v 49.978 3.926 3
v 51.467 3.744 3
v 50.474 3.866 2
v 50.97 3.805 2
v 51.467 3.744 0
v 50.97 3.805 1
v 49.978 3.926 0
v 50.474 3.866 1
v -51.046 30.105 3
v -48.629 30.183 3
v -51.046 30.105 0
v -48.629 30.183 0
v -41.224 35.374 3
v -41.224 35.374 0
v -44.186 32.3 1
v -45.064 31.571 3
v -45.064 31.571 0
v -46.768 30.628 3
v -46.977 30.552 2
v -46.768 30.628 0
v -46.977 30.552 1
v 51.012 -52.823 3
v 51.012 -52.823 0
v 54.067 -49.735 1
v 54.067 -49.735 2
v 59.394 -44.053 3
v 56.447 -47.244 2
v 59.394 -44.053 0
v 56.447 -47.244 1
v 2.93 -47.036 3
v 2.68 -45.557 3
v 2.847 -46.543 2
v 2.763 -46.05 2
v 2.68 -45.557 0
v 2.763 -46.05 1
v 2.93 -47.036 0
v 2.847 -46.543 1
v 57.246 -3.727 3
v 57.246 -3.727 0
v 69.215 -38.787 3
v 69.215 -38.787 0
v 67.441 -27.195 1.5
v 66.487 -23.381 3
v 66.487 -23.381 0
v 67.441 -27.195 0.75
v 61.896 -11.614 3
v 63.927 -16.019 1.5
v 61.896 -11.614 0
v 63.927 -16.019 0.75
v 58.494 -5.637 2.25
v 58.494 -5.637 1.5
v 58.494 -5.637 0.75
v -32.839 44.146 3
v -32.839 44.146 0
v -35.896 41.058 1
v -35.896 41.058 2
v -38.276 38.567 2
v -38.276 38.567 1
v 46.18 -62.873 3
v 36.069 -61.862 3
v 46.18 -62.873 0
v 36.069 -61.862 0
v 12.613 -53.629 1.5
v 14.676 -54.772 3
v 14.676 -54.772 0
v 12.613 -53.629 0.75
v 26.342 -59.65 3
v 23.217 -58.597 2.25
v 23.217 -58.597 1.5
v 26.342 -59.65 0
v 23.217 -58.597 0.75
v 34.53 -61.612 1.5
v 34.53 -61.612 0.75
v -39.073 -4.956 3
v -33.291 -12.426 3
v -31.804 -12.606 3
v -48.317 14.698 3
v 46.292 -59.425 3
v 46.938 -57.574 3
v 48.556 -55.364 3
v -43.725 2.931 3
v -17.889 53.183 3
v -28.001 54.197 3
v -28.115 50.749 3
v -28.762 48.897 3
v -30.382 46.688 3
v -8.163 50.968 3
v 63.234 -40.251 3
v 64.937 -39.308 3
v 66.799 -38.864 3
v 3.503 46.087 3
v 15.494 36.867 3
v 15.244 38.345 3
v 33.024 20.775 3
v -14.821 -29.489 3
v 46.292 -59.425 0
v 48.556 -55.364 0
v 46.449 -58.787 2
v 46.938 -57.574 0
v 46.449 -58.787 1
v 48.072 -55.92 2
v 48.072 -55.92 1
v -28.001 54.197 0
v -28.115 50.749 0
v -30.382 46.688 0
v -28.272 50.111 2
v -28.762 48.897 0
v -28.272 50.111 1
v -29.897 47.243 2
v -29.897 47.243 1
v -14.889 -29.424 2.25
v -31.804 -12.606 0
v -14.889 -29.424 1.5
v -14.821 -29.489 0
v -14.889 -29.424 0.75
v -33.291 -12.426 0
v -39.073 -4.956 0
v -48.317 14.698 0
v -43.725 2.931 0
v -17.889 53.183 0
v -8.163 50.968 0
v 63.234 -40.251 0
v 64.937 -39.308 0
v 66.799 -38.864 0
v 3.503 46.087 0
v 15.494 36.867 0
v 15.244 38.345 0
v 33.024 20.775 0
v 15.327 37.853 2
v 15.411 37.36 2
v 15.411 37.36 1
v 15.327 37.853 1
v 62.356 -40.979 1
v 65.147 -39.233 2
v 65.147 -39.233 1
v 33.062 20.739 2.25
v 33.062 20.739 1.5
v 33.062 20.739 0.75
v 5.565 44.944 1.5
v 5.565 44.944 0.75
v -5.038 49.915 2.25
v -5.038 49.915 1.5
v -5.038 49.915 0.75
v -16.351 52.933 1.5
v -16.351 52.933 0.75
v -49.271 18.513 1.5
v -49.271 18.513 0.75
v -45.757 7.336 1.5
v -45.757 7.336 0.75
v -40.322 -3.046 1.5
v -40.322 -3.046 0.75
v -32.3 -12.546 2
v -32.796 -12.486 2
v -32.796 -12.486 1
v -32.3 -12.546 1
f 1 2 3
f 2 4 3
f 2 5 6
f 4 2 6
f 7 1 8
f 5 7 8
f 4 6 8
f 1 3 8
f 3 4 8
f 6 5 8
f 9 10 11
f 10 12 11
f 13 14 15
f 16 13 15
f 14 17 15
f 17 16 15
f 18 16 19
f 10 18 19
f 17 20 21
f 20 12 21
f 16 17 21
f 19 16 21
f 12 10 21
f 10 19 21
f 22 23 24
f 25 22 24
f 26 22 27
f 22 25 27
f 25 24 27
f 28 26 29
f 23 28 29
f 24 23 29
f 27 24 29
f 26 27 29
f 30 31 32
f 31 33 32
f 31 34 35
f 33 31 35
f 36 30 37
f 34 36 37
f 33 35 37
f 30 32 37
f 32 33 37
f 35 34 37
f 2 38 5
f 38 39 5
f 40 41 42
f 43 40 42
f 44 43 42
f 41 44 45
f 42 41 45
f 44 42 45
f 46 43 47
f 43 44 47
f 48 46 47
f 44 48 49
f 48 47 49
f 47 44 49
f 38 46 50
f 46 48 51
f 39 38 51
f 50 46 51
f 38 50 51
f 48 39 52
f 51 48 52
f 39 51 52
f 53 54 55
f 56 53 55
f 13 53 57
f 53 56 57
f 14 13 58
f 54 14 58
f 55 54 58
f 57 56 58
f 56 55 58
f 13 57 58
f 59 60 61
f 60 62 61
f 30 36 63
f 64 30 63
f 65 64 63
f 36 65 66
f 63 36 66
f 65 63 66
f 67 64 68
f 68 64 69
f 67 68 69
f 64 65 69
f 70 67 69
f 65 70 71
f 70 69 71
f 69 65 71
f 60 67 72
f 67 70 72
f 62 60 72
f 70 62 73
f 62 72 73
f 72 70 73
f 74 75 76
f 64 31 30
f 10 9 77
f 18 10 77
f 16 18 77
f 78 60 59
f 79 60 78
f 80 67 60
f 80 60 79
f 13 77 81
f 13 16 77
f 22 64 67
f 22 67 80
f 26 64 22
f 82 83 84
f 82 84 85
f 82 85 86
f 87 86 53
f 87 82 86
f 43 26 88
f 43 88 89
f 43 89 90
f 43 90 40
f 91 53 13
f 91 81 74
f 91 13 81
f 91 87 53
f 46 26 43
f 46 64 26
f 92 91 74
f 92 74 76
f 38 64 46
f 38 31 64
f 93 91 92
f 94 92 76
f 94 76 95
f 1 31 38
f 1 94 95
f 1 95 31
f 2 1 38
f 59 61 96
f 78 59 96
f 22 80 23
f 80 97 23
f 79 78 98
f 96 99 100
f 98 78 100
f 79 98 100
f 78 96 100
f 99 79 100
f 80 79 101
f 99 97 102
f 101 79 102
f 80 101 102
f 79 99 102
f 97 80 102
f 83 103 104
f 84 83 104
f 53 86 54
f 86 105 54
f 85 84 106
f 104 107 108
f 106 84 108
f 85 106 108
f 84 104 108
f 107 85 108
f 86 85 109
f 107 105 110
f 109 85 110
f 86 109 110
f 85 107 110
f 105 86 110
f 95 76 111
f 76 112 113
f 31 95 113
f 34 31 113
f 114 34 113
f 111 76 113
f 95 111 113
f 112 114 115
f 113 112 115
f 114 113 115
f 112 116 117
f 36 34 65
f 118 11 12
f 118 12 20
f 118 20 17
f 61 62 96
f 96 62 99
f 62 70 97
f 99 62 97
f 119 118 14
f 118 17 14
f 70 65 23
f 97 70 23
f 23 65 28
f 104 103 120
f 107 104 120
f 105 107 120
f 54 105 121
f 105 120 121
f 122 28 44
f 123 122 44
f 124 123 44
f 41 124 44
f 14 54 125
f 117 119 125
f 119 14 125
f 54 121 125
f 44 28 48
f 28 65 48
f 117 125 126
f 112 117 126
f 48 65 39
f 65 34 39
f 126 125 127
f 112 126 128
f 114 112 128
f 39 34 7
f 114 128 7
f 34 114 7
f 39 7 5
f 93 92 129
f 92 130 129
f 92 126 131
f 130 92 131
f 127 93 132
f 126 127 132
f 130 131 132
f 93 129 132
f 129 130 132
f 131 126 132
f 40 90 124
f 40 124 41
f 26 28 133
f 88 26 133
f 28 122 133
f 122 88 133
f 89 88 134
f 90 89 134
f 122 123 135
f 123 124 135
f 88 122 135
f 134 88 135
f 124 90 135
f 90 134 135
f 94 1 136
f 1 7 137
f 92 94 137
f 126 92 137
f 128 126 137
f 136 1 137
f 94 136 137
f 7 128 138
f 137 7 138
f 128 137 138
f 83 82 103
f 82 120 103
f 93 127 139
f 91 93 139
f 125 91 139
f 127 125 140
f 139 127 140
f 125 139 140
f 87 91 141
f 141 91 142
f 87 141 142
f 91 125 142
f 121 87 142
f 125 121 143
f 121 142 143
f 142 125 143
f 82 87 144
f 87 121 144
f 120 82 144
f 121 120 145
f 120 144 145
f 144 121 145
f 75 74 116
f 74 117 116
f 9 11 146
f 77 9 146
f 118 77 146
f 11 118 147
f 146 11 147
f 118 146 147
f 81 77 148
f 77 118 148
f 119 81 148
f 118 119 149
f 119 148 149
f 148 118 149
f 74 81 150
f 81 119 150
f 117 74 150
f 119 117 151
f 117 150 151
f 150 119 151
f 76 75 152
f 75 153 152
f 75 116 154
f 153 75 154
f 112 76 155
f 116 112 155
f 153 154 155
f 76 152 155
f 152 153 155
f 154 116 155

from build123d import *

# Parameters (mm, degrees)
EXTRUDE_1_DEPTH = 3


with BuildPart() as part:
    # Model → Бобышка-Вытянуть1 (new body)
    with BuildSketch(Plane.XY):
        with BuildLine():
            add(Edge.make_bspline(
                [(2.93021052, -47.035829845), (7.067392634, -50.203408799), (9.192109773, -51.661949534), (16.033912525, -55.596417645), (19.531782895, -57.247377963), (26.901706576, -59.946143344), (30.729833359, -60.954279881), (38.329709704, -62.270501958), (40.987603987, -62.444811681), (46.180399423, -62.872756714)],
                knots=[0, 0, 0, 0, 0.25, 0.25, 0.5, 0.5, 0.75, 0.75, 1, 1, 1, 1], degree=3))
            add(Edge.make_bspline(
                [(46.180399423, -62.872756714), (45.758819222, -57.695353797), (47.425592056, -56.517371281), (51.012465844, -52.822648474)],
                knots=[0, 0, 0, 0, 1, 1, 1, 1], degree=3))
            add(Edge.make_bspline(
                [(51.012465844, -52.822648474), (54.819045751, -49.003718884), (55.749845461, -48.027023084), (59.394302363, -44.053029207)],
                knots=[0, 0, 0, 0, 1, 1, 1, 1], degree=3))
            add(Edge.make_bspline(
                [(59.394302363, -44.053029207), (62.922497168, -40.306572328), (64.027232354, -38.591746706), (69.215147689, -38.786552958)],
                knots=[0, 0, 0, 0, 1, 1, 1, 1], degree=3))
            add(Edge.make_bspline(
                [(69.215147689, -38.786552958), (68.559823273, -33.614049971), (68.287529116, -31.05697886), (66.59488265, -23.333351959), (65.426938577, -19.616873752), (62.427174816, -12.420563312), (60.576503981, -8.914752048), (56.410752014, -2.359714152), (54.822950455, -0.246005976), (51.466536582, 3.743837686)],
                knots=[0, 0, 0, 0, 0.25, 0.25, 0.5, 0.5, 0.75, 0.75, 1, 1, 1, 1], degree=3))
            add(Edge.make_bspline(
                [(51.466536582, 3.743837686), (50.970330899, 3.804673675), (50.474125217, 3.865509664), (49.977918997, 3.926346223)],
                knots=[0, 0, 0, 0, 1, 1, 1, 1], degree=3))
            add(Edge.make_bspline(
                [(49.977918997, 3.926346223), (46.342202727, 7.78345872), (44.298418779, 9.797169906), (38.948827381, 15.075374053), (35.988080117, 17.943328603), (30.136171062, 23.533872679), (27.409247326, 26.107876823), (21.345767872, 31.71622684), (19.515288118, 33.414658565), (15.493611073, 36.867480358)],
                knots=[0, 0, 0, 0, 0.25, 0.25, 0.5, 0.5, 0.75, 0.75, 1, 1, 1, 1], degree=3))
            add(Edge.make_bspline(
                [(15.493611073, 36.867480358), (15.410547933, 37.360005635), (15.327484793, 37.852530912), (15.244421071, 38.345056635)],
                knots=[0, 0, 0, 0, 1, 1, 1, 1], degree=3))
            add(Edge.make_bspline(
                [(15.244421071, 38.345056635), (11.108187375, 41.514140361), (8.984789105, 42.976044064), (2.145370456, 46.912195843), (-1.353124309, 48.564383816), (-8.722349322, 51.264624949), (-12.550903021, 52.273639492), (-20.150103838, 53.591559824), (-22.808358534, 53.766364957), (-28.001098537, 54.197041453)],
                knots=[0, 0, 0, 0, 0.25, 0.25, 0.5, 0.5, 0.75, 0.75, 1, 1, 1, 1], degree=3))
            add(Edge.make_bspline(
                [(-28.001098537, 54.197041453), (-27.582231733, 49.017972156), (-29.250606315, 47.841029904), (-32.8393479, 44.146128414)],
                knots=[0, 0, 0, 0, 1, 1, 1, 1], degree=3))
            add(Edge.make_bspline(
                [(-32.8393479, 44.146128414), (-36.647524986, 40.326630555), (-37.578469348, 39.349528956), (-41.224035005, 35.374474336)],
                knots=[0, 0, 0, 0, 1, 1, 1, 1], degree=3))
            add(Edge.make_bspline(
                [(-41.224035005, 35.374474336), (-44.752541009, 31.62695264), (-45.856901974, 29.91117122), (-51.045858414, 30.105043834)],
                knots=[0, 0, 0, 0, 1, 1, 1, 1], degree=3))
            add(Edge.make_bspline(
                [(-51.045858414, 30.105043834), (-50.389579788, 24.932244901), (-50.117422171, 22.37506422), (-48.424572599, 14.650618487), (-47.256661176, 10.934049352), (-44.25648622, 3.736968832), (-42.406315611, 0.232073048), (-38.237929287, -6.32500722), (-36.648825155, -8.436432959), (-33.291264991, -12.425853712)],
                knots=[0, 0, 0, 0, 0.25, 0.25, 0.5, 0.5, 0.75, 0.75, 1, 1, 1, 1], degree=3))
            add(Edge.make_bspline(
                [(-33.291264991, -12.425853712), (-32.795507537, -12.485938527), (-32.299750083, -12.546023343), (-31.803992094, -12.606108726)],
                knots=[0, 0, 0, 0, 1, 1, 1, 1], degree=3))
            add(Edge.make_bspline(
                [(-31.803992094, -12.606108726), (-28.170279016, -16.466143921), (-26.126623202, -18.477365459), (-20.773889604, -23.760459388), (-17.816009711, -26.626804665), (-11.962306891, -32.22132381), (-9.236316952, -34.795481786), (-3.173396654, -40.405117229), (-1.343127714, -42.10485992), (2.679867651, -45.557297003)],
                knots=[0, 0, 0, 0, 0.25, 0.25, 0.5, 0.5, 0.75, 0.75, 1, 1, 1, 1], degree=3))
            add(Edge.make_bspline(
                [(2.679867651, -45.557297003), (2.763315274, -46.050141284), (2.846762897, -46.542985564), (2.93021052, -47.035829845)],
                knots=[0, 0, 0, 0, 1, 1, 1, 1], degree=3))
        make_face()
    extrude(amount=EXTRUDE_1_DEPTH)


solid = part.part
